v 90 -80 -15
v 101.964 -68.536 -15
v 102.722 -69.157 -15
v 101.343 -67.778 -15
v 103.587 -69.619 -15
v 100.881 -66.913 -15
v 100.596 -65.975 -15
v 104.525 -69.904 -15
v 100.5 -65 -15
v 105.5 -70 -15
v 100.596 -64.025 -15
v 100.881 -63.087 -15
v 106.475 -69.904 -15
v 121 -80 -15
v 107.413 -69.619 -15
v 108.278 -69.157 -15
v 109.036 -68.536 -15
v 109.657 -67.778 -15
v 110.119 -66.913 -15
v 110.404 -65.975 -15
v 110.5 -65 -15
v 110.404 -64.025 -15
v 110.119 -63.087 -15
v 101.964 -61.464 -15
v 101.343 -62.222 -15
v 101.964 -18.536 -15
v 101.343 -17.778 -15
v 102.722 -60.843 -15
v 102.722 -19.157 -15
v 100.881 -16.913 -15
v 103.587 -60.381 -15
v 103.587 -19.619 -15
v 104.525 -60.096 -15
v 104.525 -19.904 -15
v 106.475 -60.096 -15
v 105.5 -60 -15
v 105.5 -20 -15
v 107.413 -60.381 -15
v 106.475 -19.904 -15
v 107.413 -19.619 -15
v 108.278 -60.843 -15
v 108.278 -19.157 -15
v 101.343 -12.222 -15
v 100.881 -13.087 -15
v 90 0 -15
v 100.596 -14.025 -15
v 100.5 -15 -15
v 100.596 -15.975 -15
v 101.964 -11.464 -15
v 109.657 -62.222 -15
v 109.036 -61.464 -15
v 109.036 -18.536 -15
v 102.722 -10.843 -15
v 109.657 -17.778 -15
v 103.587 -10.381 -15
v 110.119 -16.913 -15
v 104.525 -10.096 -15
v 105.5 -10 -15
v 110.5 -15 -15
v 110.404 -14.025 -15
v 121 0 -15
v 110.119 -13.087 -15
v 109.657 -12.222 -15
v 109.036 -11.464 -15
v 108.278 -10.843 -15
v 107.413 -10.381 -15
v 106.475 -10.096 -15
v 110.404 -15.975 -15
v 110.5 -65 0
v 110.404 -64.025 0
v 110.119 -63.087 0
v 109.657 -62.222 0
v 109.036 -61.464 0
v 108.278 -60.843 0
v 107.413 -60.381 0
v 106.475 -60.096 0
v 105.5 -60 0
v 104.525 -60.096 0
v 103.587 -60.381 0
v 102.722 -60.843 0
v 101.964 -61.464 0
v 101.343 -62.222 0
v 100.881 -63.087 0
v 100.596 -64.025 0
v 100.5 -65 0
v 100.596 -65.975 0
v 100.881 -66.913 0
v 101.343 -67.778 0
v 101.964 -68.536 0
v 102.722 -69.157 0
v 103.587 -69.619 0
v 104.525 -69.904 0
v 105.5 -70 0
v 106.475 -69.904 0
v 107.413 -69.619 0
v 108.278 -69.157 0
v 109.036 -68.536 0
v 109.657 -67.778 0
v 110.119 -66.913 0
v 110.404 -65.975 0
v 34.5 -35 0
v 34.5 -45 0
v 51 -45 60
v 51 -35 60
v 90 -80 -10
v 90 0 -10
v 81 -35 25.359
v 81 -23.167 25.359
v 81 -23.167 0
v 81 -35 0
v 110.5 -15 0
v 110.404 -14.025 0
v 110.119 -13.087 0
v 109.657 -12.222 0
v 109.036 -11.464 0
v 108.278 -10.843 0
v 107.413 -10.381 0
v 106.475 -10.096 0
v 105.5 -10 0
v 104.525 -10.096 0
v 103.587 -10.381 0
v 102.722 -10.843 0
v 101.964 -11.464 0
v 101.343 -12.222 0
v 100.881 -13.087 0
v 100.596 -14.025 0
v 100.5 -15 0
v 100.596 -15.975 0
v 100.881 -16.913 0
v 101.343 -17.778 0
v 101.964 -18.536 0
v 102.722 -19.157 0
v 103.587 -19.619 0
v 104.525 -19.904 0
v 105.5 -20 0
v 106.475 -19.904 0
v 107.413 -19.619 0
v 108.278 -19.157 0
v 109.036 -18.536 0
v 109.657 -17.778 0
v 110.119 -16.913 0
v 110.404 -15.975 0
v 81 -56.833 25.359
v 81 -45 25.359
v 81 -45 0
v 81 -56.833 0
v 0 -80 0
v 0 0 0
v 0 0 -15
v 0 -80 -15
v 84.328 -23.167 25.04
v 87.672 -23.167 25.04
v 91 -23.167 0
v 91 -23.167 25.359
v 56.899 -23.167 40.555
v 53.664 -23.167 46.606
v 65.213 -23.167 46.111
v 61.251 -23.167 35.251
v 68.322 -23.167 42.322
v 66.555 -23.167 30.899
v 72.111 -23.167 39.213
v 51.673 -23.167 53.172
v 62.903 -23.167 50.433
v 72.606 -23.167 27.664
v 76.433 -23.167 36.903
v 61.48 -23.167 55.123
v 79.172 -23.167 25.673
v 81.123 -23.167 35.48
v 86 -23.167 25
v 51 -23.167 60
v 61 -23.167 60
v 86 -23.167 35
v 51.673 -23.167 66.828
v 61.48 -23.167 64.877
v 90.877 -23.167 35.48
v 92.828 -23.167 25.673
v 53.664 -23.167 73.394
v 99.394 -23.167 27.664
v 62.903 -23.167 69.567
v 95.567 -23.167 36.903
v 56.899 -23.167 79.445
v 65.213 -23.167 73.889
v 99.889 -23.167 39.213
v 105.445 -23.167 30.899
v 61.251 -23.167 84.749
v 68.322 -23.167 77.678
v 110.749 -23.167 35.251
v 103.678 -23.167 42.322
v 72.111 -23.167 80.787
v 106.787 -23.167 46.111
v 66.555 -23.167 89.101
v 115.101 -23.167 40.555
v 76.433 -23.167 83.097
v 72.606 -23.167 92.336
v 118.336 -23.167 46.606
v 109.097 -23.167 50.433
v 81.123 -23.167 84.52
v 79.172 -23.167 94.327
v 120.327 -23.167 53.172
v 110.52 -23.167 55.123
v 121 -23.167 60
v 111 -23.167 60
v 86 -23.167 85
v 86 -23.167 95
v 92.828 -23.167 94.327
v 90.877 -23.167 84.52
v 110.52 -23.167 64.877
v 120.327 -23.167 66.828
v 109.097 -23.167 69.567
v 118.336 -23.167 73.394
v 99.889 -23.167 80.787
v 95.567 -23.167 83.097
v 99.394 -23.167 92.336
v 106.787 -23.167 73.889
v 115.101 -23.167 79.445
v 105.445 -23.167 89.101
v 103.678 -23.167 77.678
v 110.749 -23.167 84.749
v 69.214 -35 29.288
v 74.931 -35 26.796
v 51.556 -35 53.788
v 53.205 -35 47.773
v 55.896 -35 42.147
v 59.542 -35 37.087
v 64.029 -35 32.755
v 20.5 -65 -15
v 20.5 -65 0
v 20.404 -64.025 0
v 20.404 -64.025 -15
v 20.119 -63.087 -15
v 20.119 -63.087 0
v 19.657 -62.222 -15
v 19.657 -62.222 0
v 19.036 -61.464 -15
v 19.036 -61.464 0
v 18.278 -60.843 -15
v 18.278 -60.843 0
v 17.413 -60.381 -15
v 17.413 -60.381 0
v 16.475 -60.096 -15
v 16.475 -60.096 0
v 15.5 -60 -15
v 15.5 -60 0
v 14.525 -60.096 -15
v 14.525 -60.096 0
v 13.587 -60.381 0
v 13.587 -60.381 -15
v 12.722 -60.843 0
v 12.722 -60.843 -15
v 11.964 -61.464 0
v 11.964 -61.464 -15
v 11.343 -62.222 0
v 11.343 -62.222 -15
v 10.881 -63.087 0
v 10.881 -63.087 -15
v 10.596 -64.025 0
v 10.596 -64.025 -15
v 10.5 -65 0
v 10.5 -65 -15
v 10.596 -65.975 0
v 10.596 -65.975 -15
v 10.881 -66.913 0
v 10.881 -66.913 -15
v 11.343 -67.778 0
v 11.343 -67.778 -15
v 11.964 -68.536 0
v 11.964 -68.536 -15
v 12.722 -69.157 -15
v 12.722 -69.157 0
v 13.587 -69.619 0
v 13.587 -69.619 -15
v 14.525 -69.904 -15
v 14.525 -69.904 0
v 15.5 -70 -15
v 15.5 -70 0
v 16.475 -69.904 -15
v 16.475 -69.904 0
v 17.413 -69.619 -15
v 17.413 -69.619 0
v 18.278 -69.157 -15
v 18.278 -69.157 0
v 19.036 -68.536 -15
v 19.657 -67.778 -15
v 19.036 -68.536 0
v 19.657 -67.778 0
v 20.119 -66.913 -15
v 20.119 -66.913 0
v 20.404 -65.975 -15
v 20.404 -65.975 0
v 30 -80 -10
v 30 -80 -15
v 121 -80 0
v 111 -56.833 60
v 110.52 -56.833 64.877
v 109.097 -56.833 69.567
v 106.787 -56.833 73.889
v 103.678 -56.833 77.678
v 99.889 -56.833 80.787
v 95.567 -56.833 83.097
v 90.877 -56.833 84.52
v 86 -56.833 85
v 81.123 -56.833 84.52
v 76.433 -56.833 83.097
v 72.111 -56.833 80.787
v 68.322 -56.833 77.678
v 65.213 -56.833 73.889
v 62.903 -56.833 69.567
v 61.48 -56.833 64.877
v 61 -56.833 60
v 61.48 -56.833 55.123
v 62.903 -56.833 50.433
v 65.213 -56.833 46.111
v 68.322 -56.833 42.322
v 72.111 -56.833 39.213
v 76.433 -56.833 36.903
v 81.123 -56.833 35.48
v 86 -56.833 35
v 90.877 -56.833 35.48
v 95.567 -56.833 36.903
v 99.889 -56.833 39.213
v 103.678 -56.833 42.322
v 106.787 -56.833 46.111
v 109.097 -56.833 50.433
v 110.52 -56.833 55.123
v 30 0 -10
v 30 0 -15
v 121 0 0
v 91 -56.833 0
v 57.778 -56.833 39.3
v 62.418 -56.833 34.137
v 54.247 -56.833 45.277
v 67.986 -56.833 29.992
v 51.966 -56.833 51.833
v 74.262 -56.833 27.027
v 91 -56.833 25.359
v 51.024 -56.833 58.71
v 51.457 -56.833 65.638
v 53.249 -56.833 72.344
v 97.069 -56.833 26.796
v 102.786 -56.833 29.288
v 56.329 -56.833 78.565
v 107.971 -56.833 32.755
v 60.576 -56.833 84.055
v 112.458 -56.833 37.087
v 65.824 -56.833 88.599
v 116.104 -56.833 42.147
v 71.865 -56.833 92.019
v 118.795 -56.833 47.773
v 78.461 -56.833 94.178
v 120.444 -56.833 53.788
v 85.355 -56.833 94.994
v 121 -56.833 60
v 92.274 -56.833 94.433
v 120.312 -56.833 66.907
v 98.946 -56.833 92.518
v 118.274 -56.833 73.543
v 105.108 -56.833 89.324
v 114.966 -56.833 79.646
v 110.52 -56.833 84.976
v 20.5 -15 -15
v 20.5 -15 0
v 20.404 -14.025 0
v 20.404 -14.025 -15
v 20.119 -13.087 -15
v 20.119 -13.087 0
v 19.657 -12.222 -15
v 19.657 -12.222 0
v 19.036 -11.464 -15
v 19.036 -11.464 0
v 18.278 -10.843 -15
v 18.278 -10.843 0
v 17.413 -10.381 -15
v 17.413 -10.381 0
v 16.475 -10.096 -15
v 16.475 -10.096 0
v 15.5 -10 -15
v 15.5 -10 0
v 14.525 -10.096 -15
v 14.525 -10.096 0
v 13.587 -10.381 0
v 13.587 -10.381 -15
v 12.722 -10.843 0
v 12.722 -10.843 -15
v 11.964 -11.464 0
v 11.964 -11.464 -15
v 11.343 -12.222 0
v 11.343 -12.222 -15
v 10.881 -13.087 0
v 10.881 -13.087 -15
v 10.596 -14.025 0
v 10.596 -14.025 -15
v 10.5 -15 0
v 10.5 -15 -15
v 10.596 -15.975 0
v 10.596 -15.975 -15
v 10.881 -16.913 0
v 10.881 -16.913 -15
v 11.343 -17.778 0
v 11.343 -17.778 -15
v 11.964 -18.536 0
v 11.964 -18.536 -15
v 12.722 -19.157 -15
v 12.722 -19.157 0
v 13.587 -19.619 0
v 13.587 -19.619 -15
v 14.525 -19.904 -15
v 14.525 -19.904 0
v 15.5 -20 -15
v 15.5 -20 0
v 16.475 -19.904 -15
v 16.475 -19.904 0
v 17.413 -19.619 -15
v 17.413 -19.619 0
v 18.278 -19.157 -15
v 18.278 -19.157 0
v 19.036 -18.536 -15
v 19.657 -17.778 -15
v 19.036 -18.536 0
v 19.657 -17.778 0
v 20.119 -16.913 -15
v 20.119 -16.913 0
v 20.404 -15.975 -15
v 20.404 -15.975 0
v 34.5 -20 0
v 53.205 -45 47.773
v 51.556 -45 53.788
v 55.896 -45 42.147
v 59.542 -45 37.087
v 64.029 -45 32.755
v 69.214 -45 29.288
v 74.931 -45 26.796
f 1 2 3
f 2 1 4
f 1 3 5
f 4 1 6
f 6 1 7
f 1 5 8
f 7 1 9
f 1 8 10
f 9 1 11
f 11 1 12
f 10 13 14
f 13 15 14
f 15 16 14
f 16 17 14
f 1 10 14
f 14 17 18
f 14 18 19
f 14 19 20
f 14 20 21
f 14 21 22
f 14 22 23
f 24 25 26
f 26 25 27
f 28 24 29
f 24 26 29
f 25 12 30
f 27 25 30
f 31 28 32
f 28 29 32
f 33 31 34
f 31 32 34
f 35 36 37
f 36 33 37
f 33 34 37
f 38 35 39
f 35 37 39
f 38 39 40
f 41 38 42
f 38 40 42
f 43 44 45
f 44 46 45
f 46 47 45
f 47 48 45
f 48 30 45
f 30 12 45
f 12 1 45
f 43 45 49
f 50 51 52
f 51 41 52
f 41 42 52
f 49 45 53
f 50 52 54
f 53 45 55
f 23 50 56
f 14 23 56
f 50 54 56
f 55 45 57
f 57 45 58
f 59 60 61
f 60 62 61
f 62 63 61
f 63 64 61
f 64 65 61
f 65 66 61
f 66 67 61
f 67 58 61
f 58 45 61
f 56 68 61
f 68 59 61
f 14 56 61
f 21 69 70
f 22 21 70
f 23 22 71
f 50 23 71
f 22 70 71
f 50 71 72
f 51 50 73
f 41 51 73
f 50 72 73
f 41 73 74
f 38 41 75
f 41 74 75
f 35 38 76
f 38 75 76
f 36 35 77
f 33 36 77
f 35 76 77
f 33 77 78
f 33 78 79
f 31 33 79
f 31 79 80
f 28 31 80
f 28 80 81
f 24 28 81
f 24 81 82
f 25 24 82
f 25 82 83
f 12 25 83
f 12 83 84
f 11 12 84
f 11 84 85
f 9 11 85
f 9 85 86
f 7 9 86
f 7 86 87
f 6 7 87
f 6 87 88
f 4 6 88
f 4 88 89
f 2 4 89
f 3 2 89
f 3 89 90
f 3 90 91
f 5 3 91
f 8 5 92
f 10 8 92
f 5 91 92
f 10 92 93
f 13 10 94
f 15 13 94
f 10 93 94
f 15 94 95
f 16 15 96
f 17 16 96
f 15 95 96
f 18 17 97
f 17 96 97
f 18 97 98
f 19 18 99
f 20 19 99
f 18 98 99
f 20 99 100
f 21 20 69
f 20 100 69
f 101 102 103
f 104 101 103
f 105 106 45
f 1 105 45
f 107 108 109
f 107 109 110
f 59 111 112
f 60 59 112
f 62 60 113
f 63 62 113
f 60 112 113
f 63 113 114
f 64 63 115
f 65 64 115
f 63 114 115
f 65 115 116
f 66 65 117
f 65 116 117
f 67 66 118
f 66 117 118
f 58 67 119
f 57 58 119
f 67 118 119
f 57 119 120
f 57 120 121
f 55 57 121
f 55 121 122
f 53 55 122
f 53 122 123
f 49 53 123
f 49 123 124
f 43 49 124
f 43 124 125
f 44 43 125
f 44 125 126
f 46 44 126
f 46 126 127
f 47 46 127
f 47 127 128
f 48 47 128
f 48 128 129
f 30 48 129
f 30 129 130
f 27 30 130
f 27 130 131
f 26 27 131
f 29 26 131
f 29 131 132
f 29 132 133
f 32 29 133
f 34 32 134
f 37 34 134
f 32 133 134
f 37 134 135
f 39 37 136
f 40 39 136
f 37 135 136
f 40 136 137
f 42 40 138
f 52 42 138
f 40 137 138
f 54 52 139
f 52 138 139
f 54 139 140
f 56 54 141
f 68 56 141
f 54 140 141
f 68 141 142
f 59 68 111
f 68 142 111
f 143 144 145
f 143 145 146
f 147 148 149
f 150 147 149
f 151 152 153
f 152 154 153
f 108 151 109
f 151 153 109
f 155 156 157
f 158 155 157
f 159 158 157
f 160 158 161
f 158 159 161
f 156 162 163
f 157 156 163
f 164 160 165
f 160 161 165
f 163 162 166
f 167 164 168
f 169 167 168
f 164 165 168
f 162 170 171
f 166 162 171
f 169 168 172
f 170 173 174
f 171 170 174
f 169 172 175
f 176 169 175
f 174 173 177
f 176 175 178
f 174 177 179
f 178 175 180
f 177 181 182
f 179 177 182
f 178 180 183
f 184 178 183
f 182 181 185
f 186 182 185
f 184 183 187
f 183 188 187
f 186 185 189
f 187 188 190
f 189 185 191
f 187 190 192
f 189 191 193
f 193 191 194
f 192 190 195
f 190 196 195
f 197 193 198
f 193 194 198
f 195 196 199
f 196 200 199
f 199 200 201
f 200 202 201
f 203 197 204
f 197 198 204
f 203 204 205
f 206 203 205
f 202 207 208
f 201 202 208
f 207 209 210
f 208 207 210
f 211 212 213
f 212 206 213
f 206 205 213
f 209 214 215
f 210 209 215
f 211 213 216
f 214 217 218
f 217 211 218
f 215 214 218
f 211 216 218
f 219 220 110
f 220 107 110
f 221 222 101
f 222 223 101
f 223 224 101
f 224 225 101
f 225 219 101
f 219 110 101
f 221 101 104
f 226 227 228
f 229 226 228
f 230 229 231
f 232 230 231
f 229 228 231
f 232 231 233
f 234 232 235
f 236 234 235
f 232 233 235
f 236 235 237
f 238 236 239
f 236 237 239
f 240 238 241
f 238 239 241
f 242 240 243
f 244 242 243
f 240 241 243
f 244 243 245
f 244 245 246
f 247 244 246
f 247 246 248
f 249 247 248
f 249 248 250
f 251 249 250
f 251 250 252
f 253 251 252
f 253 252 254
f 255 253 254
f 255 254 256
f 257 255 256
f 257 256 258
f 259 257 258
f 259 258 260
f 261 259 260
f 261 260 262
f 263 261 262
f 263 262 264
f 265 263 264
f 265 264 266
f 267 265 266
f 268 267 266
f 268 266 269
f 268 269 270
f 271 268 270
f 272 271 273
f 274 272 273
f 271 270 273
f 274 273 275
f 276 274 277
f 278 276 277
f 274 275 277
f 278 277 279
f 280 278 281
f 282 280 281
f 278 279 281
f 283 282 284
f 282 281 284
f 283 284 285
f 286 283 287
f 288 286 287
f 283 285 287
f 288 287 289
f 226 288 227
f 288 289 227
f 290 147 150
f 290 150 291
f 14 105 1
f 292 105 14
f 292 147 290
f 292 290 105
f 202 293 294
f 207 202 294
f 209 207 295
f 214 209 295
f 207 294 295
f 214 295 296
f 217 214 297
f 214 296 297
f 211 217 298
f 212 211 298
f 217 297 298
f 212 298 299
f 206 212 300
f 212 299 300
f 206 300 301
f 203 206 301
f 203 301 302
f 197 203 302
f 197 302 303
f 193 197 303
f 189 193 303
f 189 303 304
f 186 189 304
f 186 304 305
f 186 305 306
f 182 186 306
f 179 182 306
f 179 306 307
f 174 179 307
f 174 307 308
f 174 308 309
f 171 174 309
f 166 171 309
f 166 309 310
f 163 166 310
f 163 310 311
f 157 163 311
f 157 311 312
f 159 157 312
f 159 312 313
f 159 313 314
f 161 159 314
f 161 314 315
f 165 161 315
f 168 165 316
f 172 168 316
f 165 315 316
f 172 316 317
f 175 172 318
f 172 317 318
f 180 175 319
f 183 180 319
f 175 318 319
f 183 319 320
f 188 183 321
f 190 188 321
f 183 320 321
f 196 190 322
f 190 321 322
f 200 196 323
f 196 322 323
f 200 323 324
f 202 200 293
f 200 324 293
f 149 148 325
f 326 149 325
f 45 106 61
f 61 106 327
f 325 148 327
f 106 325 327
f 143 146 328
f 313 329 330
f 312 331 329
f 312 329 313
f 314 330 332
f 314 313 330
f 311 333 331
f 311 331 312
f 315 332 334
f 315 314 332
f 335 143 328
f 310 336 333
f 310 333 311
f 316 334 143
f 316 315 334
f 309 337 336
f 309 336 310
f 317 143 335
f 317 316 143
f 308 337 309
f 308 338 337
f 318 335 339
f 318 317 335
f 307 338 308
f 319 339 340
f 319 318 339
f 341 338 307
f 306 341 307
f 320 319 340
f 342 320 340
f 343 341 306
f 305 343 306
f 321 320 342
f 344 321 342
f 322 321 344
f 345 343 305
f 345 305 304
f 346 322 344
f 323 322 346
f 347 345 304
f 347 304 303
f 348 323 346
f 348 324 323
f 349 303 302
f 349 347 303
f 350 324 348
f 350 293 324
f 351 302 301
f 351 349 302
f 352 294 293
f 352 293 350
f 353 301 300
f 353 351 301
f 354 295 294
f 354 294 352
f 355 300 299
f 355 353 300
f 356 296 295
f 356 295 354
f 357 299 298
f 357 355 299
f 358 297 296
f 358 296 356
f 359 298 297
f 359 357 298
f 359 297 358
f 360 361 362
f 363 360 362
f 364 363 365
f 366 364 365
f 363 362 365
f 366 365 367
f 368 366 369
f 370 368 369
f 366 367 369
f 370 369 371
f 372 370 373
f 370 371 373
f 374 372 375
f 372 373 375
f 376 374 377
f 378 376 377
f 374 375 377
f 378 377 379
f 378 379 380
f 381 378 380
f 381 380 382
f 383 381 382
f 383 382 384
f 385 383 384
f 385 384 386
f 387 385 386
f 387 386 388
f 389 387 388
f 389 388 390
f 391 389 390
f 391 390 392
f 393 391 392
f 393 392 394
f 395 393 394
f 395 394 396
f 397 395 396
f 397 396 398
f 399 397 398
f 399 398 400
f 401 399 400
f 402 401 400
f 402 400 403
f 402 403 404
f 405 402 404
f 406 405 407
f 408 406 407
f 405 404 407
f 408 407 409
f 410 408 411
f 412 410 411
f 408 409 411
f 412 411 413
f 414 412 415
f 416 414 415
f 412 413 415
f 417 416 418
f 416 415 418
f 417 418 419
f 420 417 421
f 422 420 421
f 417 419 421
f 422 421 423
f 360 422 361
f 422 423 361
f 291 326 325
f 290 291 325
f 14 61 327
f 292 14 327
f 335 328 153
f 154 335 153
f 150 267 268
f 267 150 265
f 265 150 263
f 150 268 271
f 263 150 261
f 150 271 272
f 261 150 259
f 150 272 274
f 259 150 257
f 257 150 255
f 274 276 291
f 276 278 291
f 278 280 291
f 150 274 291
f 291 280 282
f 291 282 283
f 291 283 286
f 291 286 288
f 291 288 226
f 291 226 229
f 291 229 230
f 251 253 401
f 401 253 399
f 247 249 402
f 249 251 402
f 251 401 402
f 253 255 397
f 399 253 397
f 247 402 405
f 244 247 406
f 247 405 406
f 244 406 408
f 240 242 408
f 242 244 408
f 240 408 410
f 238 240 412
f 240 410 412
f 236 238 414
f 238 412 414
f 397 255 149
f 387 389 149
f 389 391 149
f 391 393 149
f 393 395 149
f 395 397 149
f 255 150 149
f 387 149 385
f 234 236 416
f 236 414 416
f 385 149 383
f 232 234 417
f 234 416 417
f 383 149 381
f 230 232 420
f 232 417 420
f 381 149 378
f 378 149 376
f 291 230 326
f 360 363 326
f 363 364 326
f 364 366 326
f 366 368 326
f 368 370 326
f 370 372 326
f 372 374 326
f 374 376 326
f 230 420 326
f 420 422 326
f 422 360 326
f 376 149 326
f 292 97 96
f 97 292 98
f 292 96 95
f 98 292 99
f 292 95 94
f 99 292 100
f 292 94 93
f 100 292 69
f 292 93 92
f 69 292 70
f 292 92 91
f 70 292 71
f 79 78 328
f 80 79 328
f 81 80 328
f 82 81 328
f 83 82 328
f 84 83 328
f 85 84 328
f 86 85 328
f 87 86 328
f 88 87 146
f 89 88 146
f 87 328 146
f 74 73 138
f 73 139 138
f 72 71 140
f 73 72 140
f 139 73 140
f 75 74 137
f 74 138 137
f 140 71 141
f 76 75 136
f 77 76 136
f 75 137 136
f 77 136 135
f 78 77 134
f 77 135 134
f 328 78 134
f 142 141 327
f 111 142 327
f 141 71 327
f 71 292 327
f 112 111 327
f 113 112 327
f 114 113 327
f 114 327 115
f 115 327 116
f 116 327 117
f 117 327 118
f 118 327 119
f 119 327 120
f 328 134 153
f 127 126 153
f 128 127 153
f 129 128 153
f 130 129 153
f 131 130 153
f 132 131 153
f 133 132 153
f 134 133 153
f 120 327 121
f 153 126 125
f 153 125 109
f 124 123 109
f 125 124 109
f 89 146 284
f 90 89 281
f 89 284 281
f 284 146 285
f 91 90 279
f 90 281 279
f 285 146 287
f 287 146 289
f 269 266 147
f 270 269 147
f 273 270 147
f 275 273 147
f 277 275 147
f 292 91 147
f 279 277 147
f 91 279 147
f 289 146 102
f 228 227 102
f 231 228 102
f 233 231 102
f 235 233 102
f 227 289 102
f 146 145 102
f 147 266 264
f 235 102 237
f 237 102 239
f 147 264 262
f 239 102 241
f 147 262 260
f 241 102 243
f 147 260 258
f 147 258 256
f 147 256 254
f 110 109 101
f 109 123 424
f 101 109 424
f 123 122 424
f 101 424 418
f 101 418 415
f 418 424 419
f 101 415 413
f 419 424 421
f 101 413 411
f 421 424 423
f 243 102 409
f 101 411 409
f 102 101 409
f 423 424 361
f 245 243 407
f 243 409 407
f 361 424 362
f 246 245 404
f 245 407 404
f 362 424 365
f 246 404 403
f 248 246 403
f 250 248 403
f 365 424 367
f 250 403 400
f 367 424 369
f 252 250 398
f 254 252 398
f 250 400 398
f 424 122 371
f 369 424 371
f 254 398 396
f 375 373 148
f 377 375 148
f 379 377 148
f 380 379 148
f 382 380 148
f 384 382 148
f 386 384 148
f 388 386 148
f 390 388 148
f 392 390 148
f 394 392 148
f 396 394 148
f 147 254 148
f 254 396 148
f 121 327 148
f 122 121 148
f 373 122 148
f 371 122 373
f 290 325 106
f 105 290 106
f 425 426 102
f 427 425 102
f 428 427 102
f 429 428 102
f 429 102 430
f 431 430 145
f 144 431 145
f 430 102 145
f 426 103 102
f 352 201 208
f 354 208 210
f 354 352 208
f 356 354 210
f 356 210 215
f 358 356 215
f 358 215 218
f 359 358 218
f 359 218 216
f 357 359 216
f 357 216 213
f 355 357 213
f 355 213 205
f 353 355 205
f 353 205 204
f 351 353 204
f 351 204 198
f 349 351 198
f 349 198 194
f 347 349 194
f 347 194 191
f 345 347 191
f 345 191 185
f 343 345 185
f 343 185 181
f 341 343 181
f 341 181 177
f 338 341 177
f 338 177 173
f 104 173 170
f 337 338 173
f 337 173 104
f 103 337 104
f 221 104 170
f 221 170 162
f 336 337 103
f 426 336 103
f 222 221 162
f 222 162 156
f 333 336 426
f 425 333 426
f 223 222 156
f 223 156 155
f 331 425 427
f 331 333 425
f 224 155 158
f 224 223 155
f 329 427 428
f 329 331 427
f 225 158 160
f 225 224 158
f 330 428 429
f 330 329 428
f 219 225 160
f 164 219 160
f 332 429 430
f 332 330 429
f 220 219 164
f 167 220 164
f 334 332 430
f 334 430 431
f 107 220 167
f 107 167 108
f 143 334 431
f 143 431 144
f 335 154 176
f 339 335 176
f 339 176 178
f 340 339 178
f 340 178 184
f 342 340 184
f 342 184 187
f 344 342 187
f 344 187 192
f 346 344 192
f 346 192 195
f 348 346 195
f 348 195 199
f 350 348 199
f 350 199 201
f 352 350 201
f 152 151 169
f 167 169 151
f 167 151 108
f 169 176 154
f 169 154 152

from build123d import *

# Parameters (mm, degrees)
F1_DEPTH  = 80
F2_R      = 5
F3_DEPTH  = 25
F5_DEPTH  = 60
F6_R      = 35
F7_DEPTH  = 33.666907
F8_R      = 25
F9_DEPTH  = 52.6
F11_DEPTH = 25


with BuildPart() as f1:
    # F0 (on Front) → F1 (new body)
    with BuildSketch(Plane.XZ):
        Polygon((121, 0), (0, 0), (0, -15), (30, -15), (30, -10), (90, -10), (90, -15), (121, -15), align=None)
    extrude(amount=F1_DEPTH)

    # F2 (on face) → F3 (cut)
    with BuildSketch(Plane.XY):
        with Locations((15.5, -15)):
            Circle(F2_R)
        with Locations((15.5, -65)):
            Circle(F2_R)
        with Locations((105.5, -65)):
            Circle(F2_R)
        with Locations((105.5, -15)):
            Circle(F2_R)
    extrude(amount=-F3_DEPTH, mode=Mode.SUBTRACT)

    # F4 (on face) → F5 (join)
    with BuildSketch(Plane.XY):
        Polygon((34.5, -45), (81, -45), (81, -56.833453), (91, -56.833453), (91, -45), (91, -35), (91, -23.166547), (81, -23.166547), (81, -35), (34.5, -35), align=None)
    extrude(amount=F5_DEPTH)

    # F6 (on face) → F7 (join, through all)
    with BuildSketch(Plane.XZ.offset(56.833453)):
        with Locations((86, 60)):
            Circle(F6_R)
    extrude(amount=-F7_DEPTH)

    # F8 (on face) → F9 (cut)
    with BuildSketch(Plane.XZ.offset(56.833453)):
        with Locations((86, 60)):
            Circle(F8_R)
    extrude(amount=-F9_DEPTH, mode=Mode.SUBTRACT)

    # F10 (on face) → F11 (cut)
    with BuildSketch(Plane.XZ.offset(45)):
        Polygon((34.5, 60), (34.5, 0), (51, 60), align=None)
    extrude(amount=-F11_DEPTH, mode=Mode.SUBTRACT)


solid = f1.part
